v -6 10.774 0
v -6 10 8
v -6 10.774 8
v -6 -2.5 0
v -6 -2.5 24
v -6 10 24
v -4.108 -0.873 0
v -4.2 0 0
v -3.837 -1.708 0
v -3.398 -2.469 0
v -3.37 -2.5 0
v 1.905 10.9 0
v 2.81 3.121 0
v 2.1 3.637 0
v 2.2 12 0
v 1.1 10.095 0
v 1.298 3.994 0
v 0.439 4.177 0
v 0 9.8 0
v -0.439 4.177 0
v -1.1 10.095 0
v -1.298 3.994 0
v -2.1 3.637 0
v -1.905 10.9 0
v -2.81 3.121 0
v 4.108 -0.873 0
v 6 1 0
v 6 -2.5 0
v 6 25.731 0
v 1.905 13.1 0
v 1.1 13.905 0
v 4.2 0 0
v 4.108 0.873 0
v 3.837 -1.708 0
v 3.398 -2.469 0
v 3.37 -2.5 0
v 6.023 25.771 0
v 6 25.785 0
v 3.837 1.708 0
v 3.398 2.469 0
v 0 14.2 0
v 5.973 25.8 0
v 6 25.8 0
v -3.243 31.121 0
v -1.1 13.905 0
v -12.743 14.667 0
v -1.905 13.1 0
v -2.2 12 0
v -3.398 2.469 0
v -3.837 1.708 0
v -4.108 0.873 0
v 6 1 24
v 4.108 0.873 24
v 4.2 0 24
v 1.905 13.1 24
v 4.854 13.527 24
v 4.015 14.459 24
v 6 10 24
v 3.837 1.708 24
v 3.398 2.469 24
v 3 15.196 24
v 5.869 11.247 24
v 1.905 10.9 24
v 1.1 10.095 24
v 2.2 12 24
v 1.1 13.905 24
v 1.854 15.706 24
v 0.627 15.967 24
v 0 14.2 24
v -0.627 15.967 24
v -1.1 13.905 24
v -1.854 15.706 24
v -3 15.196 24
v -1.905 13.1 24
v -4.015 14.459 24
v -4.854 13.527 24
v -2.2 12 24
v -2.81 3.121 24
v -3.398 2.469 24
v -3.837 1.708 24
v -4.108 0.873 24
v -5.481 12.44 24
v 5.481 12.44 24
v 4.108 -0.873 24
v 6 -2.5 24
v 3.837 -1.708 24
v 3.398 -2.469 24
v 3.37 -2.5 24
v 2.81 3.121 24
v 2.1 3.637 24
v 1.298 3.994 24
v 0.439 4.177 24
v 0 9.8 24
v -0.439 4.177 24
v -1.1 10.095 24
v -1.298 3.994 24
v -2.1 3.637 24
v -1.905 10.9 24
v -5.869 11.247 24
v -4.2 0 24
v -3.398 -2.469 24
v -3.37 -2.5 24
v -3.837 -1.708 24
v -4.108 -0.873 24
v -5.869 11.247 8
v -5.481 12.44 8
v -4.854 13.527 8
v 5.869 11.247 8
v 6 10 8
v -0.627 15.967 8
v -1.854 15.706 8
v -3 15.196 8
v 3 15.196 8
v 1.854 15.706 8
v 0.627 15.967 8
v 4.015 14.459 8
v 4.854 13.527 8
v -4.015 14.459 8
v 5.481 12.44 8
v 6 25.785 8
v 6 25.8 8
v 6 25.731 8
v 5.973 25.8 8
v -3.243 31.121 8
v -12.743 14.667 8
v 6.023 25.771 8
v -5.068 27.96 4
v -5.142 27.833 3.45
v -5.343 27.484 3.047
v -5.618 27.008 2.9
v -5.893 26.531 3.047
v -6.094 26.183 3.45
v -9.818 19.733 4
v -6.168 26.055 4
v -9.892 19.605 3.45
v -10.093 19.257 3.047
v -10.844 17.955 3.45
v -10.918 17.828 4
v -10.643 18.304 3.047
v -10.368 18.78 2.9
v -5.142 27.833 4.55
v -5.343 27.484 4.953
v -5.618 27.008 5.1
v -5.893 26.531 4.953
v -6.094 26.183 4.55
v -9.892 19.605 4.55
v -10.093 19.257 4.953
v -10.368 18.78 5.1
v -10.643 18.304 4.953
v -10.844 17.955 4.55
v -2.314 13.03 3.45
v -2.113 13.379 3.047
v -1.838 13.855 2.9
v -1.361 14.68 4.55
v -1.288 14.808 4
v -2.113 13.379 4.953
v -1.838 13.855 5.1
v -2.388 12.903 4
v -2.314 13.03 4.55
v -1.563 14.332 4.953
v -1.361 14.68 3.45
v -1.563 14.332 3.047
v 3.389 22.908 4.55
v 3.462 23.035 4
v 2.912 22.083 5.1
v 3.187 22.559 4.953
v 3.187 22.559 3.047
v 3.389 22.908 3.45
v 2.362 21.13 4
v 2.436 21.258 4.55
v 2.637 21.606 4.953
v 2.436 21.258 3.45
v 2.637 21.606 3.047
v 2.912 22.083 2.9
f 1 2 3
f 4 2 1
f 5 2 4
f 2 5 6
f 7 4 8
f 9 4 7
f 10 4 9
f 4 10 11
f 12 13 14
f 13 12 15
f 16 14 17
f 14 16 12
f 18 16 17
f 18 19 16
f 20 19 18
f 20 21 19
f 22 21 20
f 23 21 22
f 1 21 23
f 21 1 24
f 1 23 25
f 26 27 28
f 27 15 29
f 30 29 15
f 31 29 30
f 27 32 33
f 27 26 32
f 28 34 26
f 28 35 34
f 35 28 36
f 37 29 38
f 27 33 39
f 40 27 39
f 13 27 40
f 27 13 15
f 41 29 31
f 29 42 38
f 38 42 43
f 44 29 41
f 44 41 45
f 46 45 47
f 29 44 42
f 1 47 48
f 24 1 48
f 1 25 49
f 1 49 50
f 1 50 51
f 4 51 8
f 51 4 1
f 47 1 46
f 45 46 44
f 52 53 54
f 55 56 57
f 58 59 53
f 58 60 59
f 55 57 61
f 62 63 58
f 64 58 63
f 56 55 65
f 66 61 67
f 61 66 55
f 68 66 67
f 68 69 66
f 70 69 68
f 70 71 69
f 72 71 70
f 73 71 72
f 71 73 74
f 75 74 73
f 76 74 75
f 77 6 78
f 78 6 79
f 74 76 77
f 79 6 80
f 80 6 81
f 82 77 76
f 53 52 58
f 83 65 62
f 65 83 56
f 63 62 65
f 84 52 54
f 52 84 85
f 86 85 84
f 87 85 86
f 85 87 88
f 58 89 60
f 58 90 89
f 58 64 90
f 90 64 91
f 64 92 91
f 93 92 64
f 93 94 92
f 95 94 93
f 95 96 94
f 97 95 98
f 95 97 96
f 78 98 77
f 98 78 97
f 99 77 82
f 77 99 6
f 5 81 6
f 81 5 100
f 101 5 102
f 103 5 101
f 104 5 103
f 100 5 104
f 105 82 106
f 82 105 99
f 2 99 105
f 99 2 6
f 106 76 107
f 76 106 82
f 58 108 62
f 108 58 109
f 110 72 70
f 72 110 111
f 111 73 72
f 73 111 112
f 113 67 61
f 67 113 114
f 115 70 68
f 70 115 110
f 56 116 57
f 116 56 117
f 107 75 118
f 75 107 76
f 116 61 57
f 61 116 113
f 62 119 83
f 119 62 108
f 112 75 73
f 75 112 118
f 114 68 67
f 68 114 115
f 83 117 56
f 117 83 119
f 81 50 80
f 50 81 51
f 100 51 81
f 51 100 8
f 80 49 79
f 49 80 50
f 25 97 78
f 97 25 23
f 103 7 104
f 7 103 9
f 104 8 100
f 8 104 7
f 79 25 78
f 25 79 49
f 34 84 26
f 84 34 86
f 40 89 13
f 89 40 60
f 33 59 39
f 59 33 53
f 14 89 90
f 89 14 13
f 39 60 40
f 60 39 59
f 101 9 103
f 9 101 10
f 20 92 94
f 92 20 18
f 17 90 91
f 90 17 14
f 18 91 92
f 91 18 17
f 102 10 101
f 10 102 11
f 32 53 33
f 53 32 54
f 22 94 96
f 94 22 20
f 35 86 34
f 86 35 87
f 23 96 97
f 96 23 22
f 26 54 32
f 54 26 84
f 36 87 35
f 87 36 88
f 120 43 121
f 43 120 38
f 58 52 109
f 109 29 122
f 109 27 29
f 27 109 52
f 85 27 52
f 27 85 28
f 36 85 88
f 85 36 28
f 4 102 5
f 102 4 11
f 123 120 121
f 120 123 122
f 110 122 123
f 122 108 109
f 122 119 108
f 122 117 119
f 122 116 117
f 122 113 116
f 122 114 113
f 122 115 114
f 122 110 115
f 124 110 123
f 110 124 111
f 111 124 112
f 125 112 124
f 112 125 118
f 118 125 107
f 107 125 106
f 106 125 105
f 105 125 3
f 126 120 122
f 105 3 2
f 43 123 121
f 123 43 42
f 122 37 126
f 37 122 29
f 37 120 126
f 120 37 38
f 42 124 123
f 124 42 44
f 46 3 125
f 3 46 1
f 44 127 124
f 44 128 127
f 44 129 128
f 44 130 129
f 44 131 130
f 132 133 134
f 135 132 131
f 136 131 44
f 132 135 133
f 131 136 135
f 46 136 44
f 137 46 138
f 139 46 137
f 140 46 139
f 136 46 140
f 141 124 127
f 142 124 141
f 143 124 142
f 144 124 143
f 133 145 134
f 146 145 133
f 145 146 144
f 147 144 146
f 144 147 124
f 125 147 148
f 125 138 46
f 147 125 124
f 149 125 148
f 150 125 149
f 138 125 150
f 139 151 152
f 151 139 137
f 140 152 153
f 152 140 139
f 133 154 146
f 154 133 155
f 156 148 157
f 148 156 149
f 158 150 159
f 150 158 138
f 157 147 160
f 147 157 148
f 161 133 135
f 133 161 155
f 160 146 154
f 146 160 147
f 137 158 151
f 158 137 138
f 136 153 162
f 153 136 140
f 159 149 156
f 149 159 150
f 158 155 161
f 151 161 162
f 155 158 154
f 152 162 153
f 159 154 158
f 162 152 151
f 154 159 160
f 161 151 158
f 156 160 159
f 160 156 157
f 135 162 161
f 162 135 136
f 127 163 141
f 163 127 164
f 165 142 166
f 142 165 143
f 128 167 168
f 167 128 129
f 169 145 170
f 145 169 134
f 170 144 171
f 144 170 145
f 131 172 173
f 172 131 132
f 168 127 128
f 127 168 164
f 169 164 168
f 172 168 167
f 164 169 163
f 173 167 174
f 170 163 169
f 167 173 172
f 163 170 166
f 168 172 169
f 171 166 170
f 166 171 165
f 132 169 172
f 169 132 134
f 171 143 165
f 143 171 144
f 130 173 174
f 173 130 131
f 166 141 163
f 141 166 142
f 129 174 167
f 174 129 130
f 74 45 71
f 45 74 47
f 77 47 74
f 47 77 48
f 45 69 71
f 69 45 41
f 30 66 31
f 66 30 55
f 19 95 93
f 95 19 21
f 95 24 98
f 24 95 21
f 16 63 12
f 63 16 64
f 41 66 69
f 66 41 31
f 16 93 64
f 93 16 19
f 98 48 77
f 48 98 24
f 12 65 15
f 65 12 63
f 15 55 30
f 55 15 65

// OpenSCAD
// file: bracket.scad
$fa = 12;
$fs = 0.5;

w = 60; // Smooth rod distance (center to center)

module screws() {
	for (x = [-w/2, w/2]) {
		translate([x, 0, 0]) {
			// Push-through M3 screw hole.
			translate([0, -6, 0]) rotate([0, 90, 0])
				cylinder(r=1.65, h=20, center=true);
			// M3 nut holder.
			translate([-x/5, -6, 0])
				rotate([30, 0, 0]) rotate([0, 90, 0])
				cylinder(r=3.2, h=2.3, center=true, $fn=6);
		}
	}
}

module bracket(h) {
	difference() {
		union() {
			translate([0, -1, 0]) cube([w+12, 22, h], center=true);
			// Sandwich mount.
			translate([-w/2, 10, 0]) cylinder(r=6, h=h, center=true);
			translate([w/2, 10, 0]) cylinder(r=6, h=h, center=true);
		}
		// Sandwich mount.
		translate([-w/2, 12, 0]) cylinder(r=1.9, h=h+1, center=true);
		translate([w/2, 12, 0]) cylinder(r=1.9, h=h+1, center=true);
		// Smooth rod mounting slots.
		for (x = [-w/2, w/2]) {
			translate([x, 0, 0]) {
				cylinder(r=4.2, h=h+1, center=true);
				translate([0, -10, 0]) cube([2, 20, h+1], center=true);
			}
		}
		// Belt path.
		translate([0, -4, 0]) cube([w-20, 20, h+1], center=true);
		translate([0, -8, 0]) cube([w-12, 20, h+1], center=true);
		translate([-w/2+10, 2, 0]) cylinder(r=4, h=h+1, center=true);
		translate([w/2-10, 2, 0]) cylinder(r=4, h=h+1, center=true);
	}
}
// main file
use <bracket.scad>;

h = 24; // Total height.
b = 8; // Bottom height (where the micro switch is attached).

module microswitch() {
	union() {
		translate([0, -3.5, 2.5]) cube([6.3, 19.66, 10.55], center=true);
		translate([0, 0, 8]) cube([3.5, 2, 3], center=true);
	}
}

x = -45 * cos(30);
y = 50 - 45 * sin(30);

% translate([30+x, y, 4]) rotate([0, 180, -30]) microswitch();

module endstop() {
	difference() {
		union() {
			translate([0, 0, -h/2]) intersection() {
				bracket(h);
				translate([30, 10, 0]) cube([12, 25, h], center=true);
			}
			translate([30, 16.3, -b/2]) cube([12, 19, b], center=true);
			translate([-x, y, -b/2]) rotate([0, 0, 30])
				translate([-3.15-5.35, -3.5, 0])
				cube([10.7, 19, b], center=true);
		}
		// M2.5x12 micro switch mounting screws.
		# translate([-x, y, -b/2]) rotate([0, 0, 30]) {
			translate([0, -3.5-9.5/2, 0]) rotate([0, 90])
				cylinder(r=1.1, h=26, center=true, $fn=12);
			translate([0, -3.5+9.5/2, 0]) rotate([0, 90])
				cylinder(r=1.1, h=26, center=true, $fn=12);
		}
		// Push-through hole for vertical M4 screw.
		translate([30, 12, -h/2])
			# cylinder(r=2.2, h=h+1, center=true, $fn=12);
	}
}

translate([30, 0, 0]) rotate([0, 180, 0]) endstop();

// use <platform.scad>;
// translate([30, 50, -16]) platform();
translate([30, 50, -16]) rotate([0, 0, 120]) translate([0, 45, 0])
% cylinder(r=1.5, h=20, center=true, $fn=12);
